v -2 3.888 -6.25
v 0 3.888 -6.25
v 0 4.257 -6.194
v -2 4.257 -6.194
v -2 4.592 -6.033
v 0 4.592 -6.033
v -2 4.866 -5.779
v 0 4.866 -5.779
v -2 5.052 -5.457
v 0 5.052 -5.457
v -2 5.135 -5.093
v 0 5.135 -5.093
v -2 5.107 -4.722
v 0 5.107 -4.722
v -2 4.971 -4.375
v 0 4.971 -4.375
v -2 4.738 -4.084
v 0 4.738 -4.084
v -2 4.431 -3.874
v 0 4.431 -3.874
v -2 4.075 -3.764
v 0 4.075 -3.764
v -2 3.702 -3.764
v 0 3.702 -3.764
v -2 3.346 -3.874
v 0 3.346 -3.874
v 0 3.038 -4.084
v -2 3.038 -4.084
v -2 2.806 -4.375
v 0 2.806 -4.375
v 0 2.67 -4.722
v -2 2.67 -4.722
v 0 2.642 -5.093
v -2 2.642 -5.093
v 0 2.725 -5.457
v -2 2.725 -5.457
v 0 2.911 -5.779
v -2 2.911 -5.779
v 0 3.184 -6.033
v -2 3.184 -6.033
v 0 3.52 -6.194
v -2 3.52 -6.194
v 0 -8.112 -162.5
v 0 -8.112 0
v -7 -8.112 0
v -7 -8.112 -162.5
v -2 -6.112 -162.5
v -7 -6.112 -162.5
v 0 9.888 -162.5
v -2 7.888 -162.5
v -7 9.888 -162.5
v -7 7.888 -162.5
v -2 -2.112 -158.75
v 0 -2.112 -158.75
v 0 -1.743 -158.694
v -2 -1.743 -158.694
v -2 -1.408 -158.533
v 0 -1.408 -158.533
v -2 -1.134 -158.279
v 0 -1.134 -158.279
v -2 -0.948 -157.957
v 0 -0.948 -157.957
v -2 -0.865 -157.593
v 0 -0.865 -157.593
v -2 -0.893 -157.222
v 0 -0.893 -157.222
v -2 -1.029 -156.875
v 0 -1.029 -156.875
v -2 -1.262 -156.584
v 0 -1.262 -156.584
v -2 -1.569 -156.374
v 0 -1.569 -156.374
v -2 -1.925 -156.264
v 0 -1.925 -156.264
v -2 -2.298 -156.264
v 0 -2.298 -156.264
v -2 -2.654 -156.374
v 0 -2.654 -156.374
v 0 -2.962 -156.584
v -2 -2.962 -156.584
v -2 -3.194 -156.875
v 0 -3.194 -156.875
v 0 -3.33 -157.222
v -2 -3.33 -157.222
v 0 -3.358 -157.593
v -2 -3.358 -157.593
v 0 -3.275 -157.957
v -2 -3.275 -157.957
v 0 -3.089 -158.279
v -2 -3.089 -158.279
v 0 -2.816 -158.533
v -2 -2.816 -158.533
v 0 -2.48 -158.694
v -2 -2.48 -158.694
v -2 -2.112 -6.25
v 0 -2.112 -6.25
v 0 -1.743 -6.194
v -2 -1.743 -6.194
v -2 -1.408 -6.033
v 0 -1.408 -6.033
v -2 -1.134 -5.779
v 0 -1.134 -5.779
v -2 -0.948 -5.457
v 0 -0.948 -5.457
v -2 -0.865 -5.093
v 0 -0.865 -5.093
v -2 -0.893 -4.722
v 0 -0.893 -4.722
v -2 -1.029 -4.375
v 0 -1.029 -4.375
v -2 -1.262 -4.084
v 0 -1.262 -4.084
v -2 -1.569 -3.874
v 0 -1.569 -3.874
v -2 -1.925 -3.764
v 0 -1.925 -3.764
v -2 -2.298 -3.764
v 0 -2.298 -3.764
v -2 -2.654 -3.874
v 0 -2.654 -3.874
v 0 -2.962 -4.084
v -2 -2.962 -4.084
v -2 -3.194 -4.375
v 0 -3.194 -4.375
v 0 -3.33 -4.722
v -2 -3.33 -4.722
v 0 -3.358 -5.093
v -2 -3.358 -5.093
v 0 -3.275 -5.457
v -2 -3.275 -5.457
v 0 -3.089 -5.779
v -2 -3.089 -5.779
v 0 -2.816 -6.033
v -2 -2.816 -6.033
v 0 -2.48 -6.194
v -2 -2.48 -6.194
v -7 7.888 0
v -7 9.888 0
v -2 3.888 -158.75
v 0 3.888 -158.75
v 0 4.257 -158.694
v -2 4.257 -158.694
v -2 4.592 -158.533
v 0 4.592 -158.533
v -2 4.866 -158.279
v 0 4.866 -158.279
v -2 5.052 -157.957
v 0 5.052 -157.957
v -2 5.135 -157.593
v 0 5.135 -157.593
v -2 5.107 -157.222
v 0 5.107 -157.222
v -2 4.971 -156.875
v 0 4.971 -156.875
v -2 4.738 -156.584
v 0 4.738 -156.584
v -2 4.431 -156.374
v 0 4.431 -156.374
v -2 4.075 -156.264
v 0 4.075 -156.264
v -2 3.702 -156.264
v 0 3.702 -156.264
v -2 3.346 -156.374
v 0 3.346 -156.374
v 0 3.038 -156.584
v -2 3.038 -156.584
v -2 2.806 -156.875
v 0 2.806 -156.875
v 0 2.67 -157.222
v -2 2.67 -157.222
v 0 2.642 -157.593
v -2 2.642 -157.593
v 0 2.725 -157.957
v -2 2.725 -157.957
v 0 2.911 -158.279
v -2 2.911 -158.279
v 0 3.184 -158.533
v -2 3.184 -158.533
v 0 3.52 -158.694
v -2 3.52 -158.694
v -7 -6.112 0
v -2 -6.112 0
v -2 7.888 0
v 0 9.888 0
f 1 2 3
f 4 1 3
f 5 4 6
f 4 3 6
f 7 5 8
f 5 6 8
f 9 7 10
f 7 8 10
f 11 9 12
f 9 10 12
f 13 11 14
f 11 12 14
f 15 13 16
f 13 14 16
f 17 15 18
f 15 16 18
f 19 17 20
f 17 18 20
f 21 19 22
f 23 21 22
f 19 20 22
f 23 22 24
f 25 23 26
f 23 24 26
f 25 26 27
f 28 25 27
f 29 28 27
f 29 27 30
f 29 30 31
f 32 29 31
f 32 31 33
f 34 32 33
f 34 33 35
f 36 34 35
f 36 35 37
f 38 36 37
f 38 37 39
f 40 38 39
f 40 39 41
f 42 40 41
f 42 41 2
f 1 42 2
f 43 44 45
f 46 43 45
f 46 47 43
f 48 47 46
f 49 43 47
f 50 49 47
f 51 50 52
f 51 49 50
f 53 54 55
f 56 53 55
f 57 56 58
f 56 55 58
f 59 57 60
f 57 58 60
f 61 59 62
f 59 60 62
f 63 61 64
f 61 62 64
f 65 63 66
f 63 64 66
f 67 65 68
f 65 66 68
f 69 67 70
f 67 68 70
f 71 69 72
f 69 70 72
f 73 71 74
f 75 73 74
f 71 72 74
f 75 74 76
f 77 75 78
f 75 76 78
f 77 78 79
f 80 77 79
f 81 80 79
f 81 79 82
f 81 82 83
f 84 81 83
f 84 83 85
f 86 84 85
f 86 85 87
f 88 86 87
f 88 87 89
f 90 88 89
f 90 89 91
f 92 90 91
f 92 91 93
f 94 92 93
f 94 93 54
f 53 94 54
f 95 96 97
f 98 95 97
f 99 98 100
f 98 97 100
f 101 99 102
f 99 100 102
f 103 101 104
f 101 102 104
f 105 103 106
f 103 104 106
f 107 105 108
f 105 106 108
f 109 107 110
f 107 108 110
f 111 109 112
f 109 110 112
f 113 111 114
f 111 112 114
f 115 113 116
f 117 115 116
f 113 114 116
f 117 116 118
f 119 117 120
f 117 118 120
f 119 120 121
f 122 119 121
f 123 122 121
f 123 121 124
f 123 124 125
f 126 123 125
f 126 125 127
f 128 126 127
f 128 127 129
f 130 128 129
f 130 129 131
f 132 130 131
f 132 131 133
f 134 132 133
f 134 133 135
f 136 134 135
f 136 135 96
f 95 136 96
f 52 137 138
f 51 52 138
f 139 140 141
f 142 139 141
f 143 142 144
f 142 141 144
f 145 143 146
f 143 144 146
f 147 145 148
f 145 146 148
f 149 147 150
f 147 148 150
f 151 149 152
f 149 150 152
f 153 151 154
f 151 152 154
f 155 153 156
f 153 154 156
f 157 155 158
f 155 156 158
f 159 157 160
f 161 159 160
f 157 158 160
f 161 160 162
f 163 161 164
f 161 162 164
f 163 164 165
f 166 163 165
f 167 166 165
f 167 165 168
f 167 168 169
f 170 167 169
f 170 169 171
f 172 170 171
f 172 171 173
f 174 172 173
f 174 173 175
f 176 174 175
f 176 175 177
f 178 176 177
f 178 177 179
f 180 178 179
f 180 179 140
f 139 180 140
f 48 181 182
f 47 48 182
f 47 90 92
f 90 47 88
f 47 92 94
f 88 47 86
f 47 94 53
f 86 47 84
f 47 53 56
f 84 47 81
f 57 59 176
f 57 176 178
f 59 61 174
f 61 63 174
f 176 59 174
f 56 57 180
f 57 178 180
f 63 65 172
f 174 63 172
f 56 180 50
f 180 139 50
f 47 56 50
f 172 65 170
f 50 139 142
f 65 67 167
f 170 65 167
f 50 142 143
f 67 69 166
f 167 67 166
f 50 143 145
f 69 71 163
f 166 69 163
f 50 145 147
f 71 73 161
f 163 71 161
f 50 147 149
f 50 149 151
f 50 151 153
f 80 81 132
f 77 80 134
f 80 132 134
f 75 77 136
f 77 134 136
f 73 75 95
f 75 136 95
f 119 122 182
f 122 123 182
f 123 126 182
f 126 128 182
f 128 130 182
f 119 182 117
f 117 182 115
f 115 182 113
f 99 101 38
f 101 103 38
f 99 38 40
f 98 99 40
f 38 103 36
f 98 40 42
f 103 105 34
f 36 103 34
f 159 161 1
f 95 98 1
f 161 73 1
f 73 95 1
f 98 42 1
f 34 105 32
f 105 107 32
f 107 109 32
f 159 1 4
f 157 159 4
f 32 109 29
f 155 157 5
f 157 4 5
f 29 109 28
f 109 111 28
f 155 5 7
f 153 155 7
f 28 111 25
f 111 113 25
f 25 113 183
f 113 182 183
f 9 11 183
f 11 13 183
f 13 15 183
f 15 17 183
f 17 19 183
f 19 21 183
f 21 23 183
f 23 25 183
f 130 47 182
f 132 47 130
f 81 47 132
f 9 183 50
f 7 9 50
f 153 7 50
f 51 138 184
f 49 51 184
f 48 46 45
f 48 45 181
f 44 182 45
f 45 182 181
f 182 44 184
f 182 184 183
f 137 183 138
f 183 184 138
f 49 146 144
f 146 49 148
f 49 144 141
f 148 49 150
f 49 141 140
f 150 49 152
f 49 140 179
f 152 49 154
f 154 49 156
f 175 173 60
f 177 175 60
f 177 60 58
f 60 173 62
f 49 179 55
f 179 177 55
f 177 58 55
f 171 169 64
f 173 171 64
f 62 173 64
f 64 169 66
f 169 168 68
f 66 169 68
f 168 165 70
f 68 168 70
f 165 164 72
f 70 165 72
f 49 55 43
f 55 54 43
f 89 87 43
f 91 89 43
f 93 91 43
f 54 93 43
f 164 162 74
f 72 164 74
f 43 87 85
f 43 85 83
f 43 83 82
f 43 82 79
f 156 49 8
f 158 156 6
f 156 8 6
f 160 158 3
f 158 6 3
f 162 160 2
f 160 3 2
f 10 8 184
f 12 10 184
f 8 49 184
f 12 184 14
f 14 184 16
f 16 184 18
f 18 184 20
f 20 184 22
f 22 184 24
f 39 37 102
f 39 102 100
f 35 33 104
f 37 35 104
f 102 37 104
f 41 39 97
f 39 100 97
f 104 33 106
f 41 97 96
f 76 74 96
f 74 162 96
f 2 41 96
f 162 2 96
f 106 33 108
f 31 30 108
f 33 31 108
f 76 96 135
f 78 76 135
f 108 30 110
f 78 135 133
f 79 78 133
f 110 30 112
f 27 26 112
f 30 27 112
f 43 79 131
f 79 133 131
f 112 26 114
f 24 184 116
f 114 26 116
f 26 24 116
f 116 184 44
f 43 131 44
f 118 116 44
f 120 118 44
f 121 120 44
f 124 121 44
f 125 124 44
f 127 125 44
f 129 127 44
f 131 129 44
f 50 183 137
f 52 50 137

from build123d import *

# Parameters (mm, degrees)
BOSS_EXTRUDE1_DEPTH = 162.5
SKETCH2_R           = 1.25
CUT_EXTRUDE1_DEPTH  = 8


with BuildPart() as part:
    # Sketch1 → Boss-Extrude1 (new body)
    with BuildSketch(Plane.XY):
        Polygon((-7, 9.888282785), (0, 9.888282785), (0, -8.111717215), (-7, -8.111717215), (-7, -6.111717215), (-2, -6.111717215), (-2, 7.888282785), (-7, 7.888282785), align=None)
    extrude(amount=-BOSS_EXTRUDE1_DEPTH)

    # Sketch2 → Cut-Extrude1 (cut, through all)
    with BuildSketch(Plane(origin=(0, 0, 0), x_dir=(0, 0, -1), z_dir=(1, 0, 0))):
        with Locations((5, 3.888282785)):
            Circle(SKETCH2_R)
        with Locations((5, -2.111717215)):
            Circle(SKETCH2_R)
        with Locations((157.5, -2.111717215)):
            Circle(SKETCH2_R)
        with Locations((157.5, 3.888282785)):
            Circle(SKETCH2_R)
    extrude(amount=-CUT_EXTRUDE1_DEPTH, mode=Mode.SUBTRACT)


solid = part.part
